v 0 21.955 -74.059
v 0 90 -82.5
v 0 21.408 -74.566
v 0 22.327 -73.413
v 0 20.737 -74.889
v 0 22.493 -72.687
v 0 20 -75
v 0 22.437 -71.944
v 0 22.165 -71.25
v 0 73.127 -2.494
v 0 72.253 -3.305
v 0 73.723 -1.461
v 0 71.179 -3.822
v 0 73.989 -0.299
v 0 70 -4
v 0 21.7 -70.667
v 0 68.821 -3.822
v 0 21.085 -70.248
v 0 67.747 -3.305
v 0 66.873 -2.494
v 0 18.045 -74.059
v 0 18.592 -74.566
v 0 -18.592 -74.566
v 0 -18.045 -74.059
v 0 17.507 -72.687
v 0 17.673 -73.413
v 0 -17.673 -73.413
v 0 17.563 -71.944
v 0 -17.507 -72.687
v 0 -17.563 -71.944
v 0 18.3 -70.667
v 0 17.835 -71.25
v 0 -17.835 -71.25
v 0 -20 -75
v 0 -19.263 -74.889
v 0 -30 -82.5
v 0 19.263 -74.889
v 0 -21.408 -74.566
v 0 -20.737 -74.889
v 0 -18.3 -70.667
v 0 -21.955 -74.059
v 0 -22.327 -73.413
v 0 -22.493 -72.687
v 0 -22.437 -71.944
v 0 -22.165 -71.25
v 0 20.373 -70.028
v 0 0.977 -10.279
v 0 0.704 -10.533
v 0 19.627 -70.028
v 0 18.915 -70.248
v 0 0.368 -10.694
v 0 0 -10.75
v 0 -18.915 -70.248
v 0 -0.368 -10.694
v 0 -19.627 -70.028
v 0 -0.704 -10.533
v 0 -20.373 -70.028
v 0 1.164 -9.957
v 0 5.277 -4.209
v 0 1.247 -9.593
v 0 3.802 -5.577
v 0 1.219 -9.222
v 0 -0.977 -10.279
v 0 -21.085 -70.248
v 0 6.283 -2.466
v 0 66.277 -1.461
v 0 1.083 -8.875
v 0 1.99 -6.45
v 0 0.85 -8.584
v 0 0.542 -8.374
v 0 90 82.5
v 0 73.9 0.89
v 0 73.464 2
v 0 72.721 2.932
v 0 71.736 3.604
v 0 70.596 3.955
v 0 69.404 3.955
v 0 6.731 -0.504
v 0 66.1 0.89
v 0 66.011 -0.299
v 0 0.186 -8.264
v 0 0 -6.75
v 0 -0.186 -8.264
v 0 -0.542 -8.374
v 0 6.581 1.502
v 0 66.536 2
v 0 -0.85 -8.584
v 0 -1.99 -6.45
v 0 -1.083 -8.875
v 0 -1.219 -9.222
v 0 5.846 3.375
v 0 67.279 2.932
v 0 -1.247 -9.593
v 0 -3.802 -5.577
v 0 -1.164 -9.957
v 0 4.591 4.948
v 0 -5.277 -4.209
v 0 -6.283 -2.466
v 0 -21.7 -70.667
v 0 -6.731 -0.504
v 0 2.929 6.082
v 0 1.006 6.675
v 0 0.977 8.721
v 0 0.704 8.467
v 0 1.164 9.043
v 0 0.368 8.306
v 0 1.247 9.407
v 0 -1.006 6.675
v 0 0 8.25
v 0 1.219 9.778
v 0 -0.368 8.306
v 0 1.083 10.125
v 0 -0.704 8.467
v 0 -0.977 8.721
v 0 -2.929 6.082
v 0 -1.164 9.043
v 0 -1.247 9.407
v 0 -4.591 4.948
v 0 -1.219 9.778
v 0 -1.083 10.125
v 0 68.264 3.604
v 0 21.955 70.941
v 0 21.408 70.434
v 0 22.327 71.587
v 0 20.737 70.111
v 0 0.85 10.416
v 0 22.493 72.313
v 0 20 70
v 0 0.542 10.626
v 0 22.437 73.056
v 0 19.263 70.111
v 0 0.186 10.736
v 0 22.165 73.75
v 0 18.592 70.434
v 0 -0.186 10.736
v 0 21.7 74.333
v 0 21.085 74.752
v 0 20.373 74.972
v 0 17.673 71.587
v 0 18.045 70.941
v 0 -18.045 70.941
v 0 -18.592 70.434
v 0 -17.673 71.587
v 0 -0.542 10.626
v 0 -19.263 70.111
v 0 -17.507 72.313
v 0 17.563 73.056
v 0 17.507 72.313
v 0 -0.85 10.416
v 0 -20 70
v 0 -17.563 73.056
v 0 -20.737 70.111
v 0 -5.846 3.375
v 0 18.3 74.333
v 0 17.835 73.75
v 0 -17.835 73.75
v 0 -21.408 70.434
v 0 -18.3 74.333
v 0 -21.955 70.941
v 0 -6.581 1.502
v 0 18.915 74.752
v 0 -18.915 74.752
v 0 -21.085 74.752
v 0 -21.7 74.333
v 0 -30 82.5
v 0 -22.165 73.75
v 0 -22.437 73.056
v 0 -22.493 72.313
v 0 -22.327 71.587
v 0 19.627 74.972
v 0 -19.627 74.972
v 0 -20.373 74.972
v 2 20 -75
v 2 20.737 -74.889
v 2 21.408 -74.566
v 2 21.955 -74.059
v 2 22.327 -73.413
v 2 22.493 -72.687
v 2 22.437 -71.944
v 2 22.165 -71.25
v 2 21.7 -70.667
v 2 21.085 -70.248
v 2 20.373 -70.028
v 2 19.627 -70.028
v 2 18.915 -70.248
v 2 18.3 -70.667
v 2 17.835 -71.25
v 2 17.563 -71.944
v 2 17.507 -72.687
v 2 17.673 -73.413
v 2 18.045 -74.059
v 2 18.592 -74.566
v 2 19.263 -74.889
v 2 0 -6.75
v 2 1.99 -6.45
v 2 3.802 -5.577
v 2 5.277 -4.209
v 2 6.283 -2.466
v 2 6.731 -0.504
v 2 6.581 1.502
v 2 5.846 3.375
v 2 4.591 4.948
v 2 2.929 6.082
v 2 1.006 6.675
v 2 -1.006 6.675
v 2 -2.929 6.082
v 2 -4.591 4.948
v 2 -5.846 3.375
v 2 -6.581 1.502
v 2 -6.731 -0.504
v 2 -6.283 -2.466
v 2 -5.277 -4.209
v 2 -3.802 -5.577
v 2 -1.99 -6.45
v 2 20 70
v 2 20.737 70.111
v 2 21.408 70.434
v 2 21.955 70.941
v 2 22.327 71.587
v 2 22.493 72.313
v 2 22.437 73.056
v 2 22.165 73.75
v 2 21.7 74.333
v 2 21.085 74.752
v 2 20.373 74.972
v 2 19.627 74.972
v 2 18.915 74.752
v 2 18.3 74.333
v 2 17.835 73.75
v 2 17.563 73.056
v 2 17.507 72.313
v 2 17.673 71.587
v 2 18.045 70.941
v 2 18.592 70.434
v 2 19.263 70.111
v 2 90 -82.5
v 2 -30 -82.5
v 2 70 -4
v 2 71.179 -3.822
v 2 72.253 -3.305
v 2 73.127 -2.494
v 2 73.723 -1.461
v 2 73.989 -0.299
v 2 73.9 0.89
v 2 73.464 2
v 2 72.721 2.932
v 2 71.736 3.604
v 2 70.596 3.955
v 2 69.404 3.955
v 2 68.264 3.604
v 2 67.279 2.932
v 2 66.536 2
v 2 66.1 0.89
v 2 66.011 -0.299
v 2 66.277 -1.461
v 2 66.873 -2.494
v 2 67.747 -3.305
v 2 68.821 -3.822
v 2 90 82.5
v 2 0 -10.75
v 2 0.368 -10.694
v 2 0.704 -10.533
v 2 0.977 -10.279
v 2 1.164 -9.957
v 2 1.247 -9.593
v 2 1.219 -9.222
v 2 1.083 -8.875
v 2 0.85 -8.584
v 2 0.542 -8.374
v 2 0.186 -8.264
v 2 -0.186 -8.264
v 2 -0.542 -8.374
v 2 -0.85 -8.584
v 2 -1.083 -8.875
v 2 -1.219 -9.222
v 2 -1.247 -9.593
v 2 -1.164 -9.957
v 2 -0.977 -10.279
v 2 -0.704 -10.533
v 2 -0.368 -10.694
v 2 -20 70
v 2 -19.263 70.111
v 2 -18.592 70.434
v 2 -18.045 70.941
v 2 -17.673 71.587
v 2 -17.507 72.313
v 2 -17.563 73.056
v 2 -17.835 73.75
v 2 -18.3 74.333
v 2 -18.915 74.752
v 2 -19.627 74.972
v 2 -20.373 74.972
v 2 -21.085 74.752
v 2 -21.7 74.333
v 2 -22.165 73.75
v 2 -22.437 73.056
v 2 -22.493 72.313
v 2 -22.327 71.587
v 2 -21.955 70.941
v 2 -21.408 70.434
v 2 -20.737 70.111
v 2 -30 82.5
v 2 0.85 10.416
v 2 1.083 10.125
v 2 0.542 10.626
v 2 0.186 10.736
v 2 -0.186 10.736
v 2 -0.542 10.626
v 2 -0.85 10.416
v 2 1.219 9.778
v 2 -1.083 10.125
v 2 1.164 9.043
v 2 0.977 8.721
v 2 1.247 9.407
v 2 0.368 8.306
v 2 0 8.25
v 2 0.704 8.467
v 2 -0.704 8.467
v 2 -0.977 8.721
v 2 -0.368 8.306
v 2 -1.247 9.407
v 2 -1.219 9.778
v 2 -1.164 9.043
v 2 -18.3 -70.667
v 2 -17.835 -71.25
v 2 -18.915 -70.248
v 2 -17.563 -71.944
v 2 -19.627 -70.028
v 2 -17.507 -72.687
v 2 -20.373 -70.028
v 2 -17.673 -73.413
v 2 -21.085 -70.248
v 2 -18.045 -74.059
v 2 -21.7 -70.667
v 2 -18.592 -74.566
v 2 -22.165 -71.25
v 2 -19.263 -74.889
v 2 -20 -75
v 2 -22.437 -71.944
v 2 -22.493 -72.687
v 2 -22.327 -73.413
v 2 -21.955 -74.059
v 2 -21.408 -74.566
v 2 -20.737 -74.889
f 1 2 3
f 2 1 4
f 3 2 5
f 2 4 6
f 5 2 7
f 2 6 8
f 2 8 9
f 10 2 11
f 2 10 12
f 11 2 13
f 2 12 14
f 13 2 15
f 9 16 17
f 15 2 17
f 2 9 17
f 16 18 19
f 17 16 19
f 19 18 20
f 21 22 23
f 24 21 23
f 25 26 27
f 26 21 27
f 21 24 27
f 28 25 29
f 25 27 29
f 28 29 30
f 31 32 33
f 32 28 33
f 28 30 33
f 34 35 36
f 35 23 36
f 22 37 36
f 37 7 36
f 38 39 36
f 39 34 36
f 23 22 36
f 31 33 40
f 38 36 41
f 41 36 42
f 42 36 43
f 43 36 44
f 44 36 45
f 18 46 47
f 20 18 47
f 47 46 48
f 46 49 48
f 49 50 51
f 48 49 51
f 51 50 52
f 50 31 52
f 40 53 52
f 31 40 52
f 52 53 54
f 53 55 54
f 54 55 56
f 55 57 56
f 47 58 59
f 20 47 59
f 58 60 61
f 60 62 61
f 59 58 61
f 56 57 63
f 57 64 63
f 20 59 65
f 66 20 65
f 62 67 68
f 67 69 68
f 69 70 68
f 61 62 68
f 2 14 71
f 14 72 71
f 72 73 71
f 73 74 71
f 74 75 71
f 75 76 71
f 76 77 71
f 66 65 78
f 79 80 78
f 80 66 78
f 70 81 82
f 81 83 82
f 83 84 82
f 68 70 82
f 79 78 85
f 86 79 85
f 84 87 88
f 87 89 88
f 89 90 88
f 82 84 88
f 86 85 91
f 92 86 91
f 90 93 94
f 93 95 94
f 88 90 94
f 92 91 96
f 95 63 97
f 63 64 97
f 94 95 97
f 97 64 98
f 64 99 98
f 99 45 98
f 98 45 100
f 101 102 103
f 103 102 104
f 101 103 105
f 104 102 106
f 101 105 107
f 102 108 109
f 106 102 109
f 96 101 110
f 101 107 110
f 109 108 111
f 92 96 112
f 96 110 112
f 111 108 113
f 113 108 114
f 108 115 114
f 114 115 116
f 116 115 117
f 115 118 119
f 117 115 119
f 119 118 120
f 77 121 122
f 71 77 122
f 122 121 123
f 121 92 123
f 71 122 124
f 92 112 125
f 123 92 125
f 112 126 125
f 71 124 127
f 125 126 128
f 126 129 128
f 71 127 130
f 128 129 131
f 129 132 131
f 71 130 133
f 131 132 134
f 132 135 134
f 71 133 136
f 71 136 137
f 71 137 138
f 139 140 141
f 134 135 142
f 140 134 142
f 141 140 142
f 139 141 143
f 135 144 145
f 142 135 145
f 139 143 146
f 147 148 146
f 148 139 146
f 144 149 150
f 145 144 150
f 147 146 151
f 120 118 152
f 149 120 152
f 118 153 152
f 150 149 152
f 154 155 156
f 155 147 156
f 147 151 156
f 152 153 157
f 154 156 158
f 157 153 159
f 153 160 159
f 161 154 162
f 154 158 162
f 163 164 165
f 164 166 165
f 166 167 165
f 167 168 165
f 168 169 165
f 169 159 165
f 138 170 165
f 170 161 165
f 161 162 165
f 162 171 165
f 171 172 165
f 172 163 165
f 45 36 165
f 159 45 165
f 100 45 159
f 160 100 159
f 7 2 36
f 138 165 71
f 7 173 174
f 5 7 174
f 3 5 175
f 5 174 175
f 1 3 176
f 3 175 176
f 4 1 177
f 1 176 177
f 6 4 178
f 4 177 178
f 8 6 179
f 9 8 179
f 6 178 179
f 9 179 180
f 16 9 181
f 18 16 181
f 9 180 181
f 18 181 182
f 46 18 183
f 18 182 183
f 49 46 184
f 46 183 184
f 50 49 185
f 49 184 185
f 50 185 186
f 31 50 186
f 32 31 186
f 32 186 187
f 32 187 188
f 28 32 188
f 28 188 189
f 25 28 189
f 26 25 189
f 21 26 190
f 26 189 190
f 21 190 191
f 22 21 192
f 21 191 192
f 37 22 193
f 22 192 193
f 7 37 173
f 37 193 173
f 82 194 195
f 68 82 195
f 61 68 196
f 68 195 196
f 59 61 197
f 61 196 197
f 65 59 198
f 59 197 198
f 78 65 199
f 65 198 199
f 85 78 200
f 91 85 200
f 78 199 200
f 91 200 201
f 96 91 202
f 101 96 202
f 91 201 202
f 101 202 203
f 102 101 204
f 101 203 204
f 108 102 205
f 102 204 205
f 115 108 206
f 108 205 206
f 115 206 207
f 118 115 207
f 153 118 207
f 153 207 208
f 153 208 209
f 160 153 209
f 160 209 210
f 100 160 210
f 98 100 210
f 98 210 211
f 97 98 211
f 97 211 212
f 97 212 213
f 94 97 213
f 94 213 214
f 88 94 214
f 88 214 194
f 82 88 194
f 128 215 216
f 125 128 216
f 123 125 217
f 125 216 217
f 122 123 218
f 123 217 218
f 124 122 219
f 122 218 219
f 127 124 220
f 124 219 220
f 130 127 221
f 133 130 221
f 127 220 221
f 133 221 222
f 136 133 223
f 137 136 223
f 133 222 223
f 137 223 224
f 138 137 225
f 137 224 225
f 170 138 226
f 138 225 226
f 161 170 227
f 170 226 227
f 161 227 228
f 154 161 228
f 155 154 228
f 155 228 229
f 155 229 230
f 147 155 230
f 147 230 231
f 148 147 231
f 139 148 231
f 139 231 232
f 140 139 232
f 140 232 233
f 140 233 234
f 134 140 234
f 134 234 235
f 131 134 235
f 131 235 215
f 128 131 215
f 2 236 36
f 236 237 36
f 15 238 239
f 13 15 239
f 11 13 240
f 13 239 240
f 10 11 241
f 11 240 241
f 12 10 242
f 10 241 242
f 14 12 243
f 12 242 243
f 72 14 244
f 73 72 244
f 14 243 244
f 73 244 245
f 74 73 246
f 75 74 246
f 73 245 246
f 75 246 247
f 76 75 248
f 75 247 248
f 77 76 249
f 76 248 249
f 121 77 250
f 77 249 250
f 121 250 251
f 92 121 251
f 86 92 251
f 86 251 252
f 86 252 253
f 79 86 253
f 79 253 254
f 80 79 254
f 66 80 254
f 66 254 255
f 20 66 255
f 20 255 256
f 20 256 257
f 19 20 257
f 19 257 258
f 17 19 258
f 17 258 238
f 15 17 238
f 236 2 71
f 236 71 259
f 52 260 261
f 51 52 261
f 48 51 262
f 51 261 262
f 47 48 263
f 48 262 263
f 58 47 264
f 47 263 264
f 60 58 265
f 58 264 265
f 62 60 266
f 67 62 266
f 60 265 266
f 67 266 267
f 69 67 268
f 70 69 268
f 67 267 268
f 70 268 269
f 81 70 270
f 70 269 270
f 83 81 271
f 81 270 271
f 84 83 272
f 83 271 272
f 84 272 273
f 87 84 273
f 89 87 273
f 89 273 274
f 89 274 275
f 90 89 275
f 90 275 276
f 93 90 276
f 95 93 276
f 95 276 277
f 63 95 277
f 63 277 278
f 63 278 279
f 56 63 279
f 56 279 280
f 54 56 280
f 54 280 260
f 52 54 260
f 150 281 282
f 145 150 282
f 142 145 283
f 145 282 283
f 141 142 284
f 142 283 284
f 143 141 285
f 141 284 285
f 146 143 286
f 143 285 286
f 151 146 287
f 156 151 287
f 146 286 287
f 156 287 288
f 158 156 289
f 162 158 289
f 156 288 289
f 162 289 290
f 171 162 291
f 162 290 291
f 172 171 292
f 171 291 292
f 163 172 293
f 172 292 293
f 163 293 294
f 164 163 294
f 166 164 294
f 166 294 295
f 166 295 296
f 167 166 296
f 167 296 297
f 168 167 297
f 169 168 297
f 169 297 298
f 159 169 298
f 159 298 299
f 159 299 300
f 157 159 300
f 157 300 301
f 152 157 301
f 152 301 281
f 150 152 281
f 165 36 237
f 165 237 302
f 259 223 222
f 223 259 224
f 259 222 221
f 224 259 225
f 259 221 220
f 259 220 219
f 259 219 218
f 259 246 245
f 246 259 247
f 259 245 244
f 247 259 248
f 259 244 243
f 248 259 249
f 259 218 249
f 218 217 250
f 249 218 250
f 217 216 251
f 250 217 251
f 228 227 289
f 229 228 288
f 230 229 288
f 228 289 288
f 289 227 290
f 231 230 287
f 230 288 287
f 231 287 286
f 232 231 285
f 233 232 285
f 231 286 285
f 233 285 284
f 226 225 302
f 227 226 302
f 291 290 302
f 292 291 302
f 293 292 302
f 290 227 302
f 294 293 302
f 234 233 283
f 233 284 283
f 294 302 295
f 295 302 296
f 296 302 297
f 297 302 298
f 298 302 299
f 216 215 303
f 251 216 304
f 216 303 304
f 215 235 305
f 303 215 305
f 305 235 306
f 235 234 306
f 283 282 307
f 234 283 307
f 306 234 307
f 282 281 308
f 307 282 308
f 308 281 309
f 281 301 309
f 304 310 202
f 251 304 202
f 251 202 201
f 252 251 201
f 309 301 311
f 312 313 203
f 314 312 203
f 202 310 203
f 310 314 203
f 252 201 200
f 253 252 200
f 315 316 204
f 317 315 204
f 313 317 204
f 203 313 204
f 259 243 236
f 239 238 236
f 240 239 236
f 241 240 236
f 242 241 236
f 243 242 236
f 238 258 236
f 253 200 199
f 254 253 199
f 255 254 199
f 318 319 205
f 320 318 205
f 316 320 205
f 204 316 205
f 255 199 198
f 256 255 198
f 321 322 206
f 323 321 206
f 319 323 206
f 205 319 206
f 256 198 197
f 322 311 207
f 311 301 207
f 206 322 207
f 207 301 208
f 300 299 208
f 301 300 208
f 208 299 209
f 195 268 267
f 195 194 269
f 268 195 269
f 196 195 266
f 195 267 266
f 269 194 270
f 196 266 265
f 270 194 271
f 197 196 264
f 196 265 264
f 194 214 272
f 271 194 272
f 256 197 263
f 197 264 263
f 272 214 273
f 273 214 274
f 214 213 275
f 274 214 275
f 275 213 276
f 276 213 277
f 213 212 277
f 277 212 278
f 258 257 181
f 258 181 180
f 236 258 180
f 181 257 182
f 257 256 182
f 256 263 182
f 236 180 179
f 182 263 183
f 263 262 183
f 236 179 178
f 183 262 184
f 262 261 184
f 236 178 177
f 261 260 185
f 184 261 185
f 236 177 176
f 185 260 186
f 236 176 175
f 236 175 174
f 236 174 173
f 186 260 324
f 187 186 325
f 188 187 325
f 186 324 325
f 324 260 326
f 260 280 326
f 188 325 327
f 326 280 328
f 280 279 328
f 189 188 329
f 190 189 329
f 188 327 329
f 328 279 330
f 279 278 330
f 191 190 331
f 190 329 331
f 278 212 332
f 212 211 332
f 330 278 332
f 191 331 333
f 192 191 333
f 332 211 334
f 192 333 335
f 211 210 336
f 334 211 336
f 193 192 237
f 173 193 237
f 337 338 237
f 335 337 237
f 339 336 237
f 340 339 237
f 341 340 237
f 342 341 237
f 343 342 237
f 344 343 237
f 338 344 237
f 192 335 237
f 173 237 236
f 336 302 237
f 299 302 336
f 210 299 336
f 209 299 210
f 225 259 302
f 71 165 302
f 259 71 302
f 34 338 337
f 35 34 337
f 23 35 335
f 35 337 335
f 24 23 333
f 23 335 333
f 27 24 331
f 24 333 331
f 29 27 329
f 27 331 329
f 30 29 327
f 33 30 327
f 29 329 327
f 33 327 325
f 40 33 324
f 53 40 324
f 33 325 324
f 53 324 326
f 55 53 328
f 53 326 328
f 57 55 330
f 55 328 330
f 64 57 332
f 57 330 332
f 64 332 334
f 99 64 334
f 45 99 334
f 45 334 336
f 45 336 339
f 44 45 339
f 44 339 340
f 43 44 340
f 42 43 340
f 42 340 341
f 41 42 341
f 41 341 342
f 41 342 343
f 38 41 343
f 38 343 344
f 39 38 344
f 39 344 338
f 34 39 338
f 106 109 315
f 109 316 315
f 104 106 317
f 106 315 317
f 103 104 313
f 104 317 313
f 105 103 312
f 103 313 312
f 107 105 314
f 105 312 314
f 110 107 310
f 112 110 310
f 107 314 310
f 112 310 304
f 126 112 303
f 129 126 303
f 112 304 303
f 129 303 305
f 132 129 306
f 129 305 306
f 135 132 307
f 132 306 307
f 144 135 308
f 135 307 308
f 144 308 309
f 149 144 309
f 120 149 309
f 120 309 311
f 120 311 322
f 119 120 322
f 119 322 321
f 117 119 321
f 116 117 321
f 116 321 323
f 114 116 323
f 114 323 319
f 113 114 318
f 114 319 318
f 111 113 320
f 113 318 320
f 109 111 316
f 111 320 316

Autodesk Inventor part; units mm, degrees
ref_plane "YZ Plane" through (0, 0, 0) normal (1, 0, 0) x (0, 1, 0)
ref_plane "XZ Plane" through (0, 0, 0) normal (0, 1, 0) x (-1, 0, 0)
ref_plane "XY Plane" through (0, 0, 0) normal (0, 0, 1) x (1, 0, 0)
sketch "Skizze1" plane through (0, 0, 0) normal (1, 0, 0) x (0, 1, 0)
  line L0 (-30, 82.5) -> (30, 82.5)
  line L1 (30, 82.5) -> (30, -82.5)
  line L2 (30, -82.5) -> (-30, -82.5)
  line L3 (-30, -82.5) -> (-30, 82.5)
  line L4 (-30, 82.5) -> (30, -82.5) construction
  line L5 (30, 82.5) -> (-30, -82.5) construction
  point P0 (0, 0)
  dimension "d0" = 165
  dimension "d1" = 60
extrude "Extrusion1" add sketch "Skizze1" along normal blind 2
sketch "Skizze2" plane through (2, 0, 0) normal (1, 0, 0) x (0, 0, -1)
  circle A0 centre (0, 0) radius 6.75
  circle A1 centre (9.5, 0) radius 1.25
  circle A2 centre (-9.5, 0) radius 1.25
  circle A3 centre (-72.5, 20) radius 2.5
  circle A4 centre (-72.5, -20) radius 2.5
  circle A5 centre (72.5, 20) radius 2.5
  circle A6 centre (72.5, -20) radius 2.5
  line L0 (-82.5, 30) -> (-82.5, -30) projected
  line L1 (-82.5, -30) -> (82.5, -30) projected
  line L2 (82.5, 30) -> (-82.5, 30) projected
  dimension "d4" = 13.5
  dimension "d5" = 19
  dimension "d6" = 9.5
  dimension "d7" = 2.5
  dimension "d8" = 2.5
  dimension "d9" = 5
  dimension "d10" = 5
  dimension "d11" = 5
  dimension "d12" = 5
  dimension "d14" = 145
  dimension "d15" = 72.5
  dimension "d16" = 145
  dimension "d17" = 72.5
  dimension "d18" = 10
  dimension "d19" = 10
  dimension "d20" = 10
  dimension "d21" = 10
extrude "Extrusion2" cut sketch "Skizze2" against normal blind 5
sketch "Skizze3" plane through (0, 30, 82.5) normal (0, 1, 0) x (1, 0, 0)
  line L0 (0, 165) -> (0, 0) projected
  line L1 (0, 0) -> (2, 0)
  line L2 (2, 0) -> (2, 165)
  line L3 (2, 165) -> (0, 165)
  line L4 (0, 165) -> (0, 0)
  point P0 (0, 82.5)
extrude "Extrusion3" add sketch "Skizze3" along normal blind 60
sketch "Skizze4" plane through (2, 0, 0) normal (1, 0, 0) x (0, 0, -1)
  circle A0 centre (0, 70) radius 4
  point P0 (0, 0)
  dimension "d26" = 70
  dimension "d27" = 8
extrude "Extrusion4" cut sketch "Skizze4" against normal blind 45
equation "\"d6\" = 0.5 * d5"
equation "\"d15\" = 0.5 * d14"
equation "\"d17\" = 0.5 * d16"
equation "\"d22\" = d11"
properties part number "Motorblechdive"
